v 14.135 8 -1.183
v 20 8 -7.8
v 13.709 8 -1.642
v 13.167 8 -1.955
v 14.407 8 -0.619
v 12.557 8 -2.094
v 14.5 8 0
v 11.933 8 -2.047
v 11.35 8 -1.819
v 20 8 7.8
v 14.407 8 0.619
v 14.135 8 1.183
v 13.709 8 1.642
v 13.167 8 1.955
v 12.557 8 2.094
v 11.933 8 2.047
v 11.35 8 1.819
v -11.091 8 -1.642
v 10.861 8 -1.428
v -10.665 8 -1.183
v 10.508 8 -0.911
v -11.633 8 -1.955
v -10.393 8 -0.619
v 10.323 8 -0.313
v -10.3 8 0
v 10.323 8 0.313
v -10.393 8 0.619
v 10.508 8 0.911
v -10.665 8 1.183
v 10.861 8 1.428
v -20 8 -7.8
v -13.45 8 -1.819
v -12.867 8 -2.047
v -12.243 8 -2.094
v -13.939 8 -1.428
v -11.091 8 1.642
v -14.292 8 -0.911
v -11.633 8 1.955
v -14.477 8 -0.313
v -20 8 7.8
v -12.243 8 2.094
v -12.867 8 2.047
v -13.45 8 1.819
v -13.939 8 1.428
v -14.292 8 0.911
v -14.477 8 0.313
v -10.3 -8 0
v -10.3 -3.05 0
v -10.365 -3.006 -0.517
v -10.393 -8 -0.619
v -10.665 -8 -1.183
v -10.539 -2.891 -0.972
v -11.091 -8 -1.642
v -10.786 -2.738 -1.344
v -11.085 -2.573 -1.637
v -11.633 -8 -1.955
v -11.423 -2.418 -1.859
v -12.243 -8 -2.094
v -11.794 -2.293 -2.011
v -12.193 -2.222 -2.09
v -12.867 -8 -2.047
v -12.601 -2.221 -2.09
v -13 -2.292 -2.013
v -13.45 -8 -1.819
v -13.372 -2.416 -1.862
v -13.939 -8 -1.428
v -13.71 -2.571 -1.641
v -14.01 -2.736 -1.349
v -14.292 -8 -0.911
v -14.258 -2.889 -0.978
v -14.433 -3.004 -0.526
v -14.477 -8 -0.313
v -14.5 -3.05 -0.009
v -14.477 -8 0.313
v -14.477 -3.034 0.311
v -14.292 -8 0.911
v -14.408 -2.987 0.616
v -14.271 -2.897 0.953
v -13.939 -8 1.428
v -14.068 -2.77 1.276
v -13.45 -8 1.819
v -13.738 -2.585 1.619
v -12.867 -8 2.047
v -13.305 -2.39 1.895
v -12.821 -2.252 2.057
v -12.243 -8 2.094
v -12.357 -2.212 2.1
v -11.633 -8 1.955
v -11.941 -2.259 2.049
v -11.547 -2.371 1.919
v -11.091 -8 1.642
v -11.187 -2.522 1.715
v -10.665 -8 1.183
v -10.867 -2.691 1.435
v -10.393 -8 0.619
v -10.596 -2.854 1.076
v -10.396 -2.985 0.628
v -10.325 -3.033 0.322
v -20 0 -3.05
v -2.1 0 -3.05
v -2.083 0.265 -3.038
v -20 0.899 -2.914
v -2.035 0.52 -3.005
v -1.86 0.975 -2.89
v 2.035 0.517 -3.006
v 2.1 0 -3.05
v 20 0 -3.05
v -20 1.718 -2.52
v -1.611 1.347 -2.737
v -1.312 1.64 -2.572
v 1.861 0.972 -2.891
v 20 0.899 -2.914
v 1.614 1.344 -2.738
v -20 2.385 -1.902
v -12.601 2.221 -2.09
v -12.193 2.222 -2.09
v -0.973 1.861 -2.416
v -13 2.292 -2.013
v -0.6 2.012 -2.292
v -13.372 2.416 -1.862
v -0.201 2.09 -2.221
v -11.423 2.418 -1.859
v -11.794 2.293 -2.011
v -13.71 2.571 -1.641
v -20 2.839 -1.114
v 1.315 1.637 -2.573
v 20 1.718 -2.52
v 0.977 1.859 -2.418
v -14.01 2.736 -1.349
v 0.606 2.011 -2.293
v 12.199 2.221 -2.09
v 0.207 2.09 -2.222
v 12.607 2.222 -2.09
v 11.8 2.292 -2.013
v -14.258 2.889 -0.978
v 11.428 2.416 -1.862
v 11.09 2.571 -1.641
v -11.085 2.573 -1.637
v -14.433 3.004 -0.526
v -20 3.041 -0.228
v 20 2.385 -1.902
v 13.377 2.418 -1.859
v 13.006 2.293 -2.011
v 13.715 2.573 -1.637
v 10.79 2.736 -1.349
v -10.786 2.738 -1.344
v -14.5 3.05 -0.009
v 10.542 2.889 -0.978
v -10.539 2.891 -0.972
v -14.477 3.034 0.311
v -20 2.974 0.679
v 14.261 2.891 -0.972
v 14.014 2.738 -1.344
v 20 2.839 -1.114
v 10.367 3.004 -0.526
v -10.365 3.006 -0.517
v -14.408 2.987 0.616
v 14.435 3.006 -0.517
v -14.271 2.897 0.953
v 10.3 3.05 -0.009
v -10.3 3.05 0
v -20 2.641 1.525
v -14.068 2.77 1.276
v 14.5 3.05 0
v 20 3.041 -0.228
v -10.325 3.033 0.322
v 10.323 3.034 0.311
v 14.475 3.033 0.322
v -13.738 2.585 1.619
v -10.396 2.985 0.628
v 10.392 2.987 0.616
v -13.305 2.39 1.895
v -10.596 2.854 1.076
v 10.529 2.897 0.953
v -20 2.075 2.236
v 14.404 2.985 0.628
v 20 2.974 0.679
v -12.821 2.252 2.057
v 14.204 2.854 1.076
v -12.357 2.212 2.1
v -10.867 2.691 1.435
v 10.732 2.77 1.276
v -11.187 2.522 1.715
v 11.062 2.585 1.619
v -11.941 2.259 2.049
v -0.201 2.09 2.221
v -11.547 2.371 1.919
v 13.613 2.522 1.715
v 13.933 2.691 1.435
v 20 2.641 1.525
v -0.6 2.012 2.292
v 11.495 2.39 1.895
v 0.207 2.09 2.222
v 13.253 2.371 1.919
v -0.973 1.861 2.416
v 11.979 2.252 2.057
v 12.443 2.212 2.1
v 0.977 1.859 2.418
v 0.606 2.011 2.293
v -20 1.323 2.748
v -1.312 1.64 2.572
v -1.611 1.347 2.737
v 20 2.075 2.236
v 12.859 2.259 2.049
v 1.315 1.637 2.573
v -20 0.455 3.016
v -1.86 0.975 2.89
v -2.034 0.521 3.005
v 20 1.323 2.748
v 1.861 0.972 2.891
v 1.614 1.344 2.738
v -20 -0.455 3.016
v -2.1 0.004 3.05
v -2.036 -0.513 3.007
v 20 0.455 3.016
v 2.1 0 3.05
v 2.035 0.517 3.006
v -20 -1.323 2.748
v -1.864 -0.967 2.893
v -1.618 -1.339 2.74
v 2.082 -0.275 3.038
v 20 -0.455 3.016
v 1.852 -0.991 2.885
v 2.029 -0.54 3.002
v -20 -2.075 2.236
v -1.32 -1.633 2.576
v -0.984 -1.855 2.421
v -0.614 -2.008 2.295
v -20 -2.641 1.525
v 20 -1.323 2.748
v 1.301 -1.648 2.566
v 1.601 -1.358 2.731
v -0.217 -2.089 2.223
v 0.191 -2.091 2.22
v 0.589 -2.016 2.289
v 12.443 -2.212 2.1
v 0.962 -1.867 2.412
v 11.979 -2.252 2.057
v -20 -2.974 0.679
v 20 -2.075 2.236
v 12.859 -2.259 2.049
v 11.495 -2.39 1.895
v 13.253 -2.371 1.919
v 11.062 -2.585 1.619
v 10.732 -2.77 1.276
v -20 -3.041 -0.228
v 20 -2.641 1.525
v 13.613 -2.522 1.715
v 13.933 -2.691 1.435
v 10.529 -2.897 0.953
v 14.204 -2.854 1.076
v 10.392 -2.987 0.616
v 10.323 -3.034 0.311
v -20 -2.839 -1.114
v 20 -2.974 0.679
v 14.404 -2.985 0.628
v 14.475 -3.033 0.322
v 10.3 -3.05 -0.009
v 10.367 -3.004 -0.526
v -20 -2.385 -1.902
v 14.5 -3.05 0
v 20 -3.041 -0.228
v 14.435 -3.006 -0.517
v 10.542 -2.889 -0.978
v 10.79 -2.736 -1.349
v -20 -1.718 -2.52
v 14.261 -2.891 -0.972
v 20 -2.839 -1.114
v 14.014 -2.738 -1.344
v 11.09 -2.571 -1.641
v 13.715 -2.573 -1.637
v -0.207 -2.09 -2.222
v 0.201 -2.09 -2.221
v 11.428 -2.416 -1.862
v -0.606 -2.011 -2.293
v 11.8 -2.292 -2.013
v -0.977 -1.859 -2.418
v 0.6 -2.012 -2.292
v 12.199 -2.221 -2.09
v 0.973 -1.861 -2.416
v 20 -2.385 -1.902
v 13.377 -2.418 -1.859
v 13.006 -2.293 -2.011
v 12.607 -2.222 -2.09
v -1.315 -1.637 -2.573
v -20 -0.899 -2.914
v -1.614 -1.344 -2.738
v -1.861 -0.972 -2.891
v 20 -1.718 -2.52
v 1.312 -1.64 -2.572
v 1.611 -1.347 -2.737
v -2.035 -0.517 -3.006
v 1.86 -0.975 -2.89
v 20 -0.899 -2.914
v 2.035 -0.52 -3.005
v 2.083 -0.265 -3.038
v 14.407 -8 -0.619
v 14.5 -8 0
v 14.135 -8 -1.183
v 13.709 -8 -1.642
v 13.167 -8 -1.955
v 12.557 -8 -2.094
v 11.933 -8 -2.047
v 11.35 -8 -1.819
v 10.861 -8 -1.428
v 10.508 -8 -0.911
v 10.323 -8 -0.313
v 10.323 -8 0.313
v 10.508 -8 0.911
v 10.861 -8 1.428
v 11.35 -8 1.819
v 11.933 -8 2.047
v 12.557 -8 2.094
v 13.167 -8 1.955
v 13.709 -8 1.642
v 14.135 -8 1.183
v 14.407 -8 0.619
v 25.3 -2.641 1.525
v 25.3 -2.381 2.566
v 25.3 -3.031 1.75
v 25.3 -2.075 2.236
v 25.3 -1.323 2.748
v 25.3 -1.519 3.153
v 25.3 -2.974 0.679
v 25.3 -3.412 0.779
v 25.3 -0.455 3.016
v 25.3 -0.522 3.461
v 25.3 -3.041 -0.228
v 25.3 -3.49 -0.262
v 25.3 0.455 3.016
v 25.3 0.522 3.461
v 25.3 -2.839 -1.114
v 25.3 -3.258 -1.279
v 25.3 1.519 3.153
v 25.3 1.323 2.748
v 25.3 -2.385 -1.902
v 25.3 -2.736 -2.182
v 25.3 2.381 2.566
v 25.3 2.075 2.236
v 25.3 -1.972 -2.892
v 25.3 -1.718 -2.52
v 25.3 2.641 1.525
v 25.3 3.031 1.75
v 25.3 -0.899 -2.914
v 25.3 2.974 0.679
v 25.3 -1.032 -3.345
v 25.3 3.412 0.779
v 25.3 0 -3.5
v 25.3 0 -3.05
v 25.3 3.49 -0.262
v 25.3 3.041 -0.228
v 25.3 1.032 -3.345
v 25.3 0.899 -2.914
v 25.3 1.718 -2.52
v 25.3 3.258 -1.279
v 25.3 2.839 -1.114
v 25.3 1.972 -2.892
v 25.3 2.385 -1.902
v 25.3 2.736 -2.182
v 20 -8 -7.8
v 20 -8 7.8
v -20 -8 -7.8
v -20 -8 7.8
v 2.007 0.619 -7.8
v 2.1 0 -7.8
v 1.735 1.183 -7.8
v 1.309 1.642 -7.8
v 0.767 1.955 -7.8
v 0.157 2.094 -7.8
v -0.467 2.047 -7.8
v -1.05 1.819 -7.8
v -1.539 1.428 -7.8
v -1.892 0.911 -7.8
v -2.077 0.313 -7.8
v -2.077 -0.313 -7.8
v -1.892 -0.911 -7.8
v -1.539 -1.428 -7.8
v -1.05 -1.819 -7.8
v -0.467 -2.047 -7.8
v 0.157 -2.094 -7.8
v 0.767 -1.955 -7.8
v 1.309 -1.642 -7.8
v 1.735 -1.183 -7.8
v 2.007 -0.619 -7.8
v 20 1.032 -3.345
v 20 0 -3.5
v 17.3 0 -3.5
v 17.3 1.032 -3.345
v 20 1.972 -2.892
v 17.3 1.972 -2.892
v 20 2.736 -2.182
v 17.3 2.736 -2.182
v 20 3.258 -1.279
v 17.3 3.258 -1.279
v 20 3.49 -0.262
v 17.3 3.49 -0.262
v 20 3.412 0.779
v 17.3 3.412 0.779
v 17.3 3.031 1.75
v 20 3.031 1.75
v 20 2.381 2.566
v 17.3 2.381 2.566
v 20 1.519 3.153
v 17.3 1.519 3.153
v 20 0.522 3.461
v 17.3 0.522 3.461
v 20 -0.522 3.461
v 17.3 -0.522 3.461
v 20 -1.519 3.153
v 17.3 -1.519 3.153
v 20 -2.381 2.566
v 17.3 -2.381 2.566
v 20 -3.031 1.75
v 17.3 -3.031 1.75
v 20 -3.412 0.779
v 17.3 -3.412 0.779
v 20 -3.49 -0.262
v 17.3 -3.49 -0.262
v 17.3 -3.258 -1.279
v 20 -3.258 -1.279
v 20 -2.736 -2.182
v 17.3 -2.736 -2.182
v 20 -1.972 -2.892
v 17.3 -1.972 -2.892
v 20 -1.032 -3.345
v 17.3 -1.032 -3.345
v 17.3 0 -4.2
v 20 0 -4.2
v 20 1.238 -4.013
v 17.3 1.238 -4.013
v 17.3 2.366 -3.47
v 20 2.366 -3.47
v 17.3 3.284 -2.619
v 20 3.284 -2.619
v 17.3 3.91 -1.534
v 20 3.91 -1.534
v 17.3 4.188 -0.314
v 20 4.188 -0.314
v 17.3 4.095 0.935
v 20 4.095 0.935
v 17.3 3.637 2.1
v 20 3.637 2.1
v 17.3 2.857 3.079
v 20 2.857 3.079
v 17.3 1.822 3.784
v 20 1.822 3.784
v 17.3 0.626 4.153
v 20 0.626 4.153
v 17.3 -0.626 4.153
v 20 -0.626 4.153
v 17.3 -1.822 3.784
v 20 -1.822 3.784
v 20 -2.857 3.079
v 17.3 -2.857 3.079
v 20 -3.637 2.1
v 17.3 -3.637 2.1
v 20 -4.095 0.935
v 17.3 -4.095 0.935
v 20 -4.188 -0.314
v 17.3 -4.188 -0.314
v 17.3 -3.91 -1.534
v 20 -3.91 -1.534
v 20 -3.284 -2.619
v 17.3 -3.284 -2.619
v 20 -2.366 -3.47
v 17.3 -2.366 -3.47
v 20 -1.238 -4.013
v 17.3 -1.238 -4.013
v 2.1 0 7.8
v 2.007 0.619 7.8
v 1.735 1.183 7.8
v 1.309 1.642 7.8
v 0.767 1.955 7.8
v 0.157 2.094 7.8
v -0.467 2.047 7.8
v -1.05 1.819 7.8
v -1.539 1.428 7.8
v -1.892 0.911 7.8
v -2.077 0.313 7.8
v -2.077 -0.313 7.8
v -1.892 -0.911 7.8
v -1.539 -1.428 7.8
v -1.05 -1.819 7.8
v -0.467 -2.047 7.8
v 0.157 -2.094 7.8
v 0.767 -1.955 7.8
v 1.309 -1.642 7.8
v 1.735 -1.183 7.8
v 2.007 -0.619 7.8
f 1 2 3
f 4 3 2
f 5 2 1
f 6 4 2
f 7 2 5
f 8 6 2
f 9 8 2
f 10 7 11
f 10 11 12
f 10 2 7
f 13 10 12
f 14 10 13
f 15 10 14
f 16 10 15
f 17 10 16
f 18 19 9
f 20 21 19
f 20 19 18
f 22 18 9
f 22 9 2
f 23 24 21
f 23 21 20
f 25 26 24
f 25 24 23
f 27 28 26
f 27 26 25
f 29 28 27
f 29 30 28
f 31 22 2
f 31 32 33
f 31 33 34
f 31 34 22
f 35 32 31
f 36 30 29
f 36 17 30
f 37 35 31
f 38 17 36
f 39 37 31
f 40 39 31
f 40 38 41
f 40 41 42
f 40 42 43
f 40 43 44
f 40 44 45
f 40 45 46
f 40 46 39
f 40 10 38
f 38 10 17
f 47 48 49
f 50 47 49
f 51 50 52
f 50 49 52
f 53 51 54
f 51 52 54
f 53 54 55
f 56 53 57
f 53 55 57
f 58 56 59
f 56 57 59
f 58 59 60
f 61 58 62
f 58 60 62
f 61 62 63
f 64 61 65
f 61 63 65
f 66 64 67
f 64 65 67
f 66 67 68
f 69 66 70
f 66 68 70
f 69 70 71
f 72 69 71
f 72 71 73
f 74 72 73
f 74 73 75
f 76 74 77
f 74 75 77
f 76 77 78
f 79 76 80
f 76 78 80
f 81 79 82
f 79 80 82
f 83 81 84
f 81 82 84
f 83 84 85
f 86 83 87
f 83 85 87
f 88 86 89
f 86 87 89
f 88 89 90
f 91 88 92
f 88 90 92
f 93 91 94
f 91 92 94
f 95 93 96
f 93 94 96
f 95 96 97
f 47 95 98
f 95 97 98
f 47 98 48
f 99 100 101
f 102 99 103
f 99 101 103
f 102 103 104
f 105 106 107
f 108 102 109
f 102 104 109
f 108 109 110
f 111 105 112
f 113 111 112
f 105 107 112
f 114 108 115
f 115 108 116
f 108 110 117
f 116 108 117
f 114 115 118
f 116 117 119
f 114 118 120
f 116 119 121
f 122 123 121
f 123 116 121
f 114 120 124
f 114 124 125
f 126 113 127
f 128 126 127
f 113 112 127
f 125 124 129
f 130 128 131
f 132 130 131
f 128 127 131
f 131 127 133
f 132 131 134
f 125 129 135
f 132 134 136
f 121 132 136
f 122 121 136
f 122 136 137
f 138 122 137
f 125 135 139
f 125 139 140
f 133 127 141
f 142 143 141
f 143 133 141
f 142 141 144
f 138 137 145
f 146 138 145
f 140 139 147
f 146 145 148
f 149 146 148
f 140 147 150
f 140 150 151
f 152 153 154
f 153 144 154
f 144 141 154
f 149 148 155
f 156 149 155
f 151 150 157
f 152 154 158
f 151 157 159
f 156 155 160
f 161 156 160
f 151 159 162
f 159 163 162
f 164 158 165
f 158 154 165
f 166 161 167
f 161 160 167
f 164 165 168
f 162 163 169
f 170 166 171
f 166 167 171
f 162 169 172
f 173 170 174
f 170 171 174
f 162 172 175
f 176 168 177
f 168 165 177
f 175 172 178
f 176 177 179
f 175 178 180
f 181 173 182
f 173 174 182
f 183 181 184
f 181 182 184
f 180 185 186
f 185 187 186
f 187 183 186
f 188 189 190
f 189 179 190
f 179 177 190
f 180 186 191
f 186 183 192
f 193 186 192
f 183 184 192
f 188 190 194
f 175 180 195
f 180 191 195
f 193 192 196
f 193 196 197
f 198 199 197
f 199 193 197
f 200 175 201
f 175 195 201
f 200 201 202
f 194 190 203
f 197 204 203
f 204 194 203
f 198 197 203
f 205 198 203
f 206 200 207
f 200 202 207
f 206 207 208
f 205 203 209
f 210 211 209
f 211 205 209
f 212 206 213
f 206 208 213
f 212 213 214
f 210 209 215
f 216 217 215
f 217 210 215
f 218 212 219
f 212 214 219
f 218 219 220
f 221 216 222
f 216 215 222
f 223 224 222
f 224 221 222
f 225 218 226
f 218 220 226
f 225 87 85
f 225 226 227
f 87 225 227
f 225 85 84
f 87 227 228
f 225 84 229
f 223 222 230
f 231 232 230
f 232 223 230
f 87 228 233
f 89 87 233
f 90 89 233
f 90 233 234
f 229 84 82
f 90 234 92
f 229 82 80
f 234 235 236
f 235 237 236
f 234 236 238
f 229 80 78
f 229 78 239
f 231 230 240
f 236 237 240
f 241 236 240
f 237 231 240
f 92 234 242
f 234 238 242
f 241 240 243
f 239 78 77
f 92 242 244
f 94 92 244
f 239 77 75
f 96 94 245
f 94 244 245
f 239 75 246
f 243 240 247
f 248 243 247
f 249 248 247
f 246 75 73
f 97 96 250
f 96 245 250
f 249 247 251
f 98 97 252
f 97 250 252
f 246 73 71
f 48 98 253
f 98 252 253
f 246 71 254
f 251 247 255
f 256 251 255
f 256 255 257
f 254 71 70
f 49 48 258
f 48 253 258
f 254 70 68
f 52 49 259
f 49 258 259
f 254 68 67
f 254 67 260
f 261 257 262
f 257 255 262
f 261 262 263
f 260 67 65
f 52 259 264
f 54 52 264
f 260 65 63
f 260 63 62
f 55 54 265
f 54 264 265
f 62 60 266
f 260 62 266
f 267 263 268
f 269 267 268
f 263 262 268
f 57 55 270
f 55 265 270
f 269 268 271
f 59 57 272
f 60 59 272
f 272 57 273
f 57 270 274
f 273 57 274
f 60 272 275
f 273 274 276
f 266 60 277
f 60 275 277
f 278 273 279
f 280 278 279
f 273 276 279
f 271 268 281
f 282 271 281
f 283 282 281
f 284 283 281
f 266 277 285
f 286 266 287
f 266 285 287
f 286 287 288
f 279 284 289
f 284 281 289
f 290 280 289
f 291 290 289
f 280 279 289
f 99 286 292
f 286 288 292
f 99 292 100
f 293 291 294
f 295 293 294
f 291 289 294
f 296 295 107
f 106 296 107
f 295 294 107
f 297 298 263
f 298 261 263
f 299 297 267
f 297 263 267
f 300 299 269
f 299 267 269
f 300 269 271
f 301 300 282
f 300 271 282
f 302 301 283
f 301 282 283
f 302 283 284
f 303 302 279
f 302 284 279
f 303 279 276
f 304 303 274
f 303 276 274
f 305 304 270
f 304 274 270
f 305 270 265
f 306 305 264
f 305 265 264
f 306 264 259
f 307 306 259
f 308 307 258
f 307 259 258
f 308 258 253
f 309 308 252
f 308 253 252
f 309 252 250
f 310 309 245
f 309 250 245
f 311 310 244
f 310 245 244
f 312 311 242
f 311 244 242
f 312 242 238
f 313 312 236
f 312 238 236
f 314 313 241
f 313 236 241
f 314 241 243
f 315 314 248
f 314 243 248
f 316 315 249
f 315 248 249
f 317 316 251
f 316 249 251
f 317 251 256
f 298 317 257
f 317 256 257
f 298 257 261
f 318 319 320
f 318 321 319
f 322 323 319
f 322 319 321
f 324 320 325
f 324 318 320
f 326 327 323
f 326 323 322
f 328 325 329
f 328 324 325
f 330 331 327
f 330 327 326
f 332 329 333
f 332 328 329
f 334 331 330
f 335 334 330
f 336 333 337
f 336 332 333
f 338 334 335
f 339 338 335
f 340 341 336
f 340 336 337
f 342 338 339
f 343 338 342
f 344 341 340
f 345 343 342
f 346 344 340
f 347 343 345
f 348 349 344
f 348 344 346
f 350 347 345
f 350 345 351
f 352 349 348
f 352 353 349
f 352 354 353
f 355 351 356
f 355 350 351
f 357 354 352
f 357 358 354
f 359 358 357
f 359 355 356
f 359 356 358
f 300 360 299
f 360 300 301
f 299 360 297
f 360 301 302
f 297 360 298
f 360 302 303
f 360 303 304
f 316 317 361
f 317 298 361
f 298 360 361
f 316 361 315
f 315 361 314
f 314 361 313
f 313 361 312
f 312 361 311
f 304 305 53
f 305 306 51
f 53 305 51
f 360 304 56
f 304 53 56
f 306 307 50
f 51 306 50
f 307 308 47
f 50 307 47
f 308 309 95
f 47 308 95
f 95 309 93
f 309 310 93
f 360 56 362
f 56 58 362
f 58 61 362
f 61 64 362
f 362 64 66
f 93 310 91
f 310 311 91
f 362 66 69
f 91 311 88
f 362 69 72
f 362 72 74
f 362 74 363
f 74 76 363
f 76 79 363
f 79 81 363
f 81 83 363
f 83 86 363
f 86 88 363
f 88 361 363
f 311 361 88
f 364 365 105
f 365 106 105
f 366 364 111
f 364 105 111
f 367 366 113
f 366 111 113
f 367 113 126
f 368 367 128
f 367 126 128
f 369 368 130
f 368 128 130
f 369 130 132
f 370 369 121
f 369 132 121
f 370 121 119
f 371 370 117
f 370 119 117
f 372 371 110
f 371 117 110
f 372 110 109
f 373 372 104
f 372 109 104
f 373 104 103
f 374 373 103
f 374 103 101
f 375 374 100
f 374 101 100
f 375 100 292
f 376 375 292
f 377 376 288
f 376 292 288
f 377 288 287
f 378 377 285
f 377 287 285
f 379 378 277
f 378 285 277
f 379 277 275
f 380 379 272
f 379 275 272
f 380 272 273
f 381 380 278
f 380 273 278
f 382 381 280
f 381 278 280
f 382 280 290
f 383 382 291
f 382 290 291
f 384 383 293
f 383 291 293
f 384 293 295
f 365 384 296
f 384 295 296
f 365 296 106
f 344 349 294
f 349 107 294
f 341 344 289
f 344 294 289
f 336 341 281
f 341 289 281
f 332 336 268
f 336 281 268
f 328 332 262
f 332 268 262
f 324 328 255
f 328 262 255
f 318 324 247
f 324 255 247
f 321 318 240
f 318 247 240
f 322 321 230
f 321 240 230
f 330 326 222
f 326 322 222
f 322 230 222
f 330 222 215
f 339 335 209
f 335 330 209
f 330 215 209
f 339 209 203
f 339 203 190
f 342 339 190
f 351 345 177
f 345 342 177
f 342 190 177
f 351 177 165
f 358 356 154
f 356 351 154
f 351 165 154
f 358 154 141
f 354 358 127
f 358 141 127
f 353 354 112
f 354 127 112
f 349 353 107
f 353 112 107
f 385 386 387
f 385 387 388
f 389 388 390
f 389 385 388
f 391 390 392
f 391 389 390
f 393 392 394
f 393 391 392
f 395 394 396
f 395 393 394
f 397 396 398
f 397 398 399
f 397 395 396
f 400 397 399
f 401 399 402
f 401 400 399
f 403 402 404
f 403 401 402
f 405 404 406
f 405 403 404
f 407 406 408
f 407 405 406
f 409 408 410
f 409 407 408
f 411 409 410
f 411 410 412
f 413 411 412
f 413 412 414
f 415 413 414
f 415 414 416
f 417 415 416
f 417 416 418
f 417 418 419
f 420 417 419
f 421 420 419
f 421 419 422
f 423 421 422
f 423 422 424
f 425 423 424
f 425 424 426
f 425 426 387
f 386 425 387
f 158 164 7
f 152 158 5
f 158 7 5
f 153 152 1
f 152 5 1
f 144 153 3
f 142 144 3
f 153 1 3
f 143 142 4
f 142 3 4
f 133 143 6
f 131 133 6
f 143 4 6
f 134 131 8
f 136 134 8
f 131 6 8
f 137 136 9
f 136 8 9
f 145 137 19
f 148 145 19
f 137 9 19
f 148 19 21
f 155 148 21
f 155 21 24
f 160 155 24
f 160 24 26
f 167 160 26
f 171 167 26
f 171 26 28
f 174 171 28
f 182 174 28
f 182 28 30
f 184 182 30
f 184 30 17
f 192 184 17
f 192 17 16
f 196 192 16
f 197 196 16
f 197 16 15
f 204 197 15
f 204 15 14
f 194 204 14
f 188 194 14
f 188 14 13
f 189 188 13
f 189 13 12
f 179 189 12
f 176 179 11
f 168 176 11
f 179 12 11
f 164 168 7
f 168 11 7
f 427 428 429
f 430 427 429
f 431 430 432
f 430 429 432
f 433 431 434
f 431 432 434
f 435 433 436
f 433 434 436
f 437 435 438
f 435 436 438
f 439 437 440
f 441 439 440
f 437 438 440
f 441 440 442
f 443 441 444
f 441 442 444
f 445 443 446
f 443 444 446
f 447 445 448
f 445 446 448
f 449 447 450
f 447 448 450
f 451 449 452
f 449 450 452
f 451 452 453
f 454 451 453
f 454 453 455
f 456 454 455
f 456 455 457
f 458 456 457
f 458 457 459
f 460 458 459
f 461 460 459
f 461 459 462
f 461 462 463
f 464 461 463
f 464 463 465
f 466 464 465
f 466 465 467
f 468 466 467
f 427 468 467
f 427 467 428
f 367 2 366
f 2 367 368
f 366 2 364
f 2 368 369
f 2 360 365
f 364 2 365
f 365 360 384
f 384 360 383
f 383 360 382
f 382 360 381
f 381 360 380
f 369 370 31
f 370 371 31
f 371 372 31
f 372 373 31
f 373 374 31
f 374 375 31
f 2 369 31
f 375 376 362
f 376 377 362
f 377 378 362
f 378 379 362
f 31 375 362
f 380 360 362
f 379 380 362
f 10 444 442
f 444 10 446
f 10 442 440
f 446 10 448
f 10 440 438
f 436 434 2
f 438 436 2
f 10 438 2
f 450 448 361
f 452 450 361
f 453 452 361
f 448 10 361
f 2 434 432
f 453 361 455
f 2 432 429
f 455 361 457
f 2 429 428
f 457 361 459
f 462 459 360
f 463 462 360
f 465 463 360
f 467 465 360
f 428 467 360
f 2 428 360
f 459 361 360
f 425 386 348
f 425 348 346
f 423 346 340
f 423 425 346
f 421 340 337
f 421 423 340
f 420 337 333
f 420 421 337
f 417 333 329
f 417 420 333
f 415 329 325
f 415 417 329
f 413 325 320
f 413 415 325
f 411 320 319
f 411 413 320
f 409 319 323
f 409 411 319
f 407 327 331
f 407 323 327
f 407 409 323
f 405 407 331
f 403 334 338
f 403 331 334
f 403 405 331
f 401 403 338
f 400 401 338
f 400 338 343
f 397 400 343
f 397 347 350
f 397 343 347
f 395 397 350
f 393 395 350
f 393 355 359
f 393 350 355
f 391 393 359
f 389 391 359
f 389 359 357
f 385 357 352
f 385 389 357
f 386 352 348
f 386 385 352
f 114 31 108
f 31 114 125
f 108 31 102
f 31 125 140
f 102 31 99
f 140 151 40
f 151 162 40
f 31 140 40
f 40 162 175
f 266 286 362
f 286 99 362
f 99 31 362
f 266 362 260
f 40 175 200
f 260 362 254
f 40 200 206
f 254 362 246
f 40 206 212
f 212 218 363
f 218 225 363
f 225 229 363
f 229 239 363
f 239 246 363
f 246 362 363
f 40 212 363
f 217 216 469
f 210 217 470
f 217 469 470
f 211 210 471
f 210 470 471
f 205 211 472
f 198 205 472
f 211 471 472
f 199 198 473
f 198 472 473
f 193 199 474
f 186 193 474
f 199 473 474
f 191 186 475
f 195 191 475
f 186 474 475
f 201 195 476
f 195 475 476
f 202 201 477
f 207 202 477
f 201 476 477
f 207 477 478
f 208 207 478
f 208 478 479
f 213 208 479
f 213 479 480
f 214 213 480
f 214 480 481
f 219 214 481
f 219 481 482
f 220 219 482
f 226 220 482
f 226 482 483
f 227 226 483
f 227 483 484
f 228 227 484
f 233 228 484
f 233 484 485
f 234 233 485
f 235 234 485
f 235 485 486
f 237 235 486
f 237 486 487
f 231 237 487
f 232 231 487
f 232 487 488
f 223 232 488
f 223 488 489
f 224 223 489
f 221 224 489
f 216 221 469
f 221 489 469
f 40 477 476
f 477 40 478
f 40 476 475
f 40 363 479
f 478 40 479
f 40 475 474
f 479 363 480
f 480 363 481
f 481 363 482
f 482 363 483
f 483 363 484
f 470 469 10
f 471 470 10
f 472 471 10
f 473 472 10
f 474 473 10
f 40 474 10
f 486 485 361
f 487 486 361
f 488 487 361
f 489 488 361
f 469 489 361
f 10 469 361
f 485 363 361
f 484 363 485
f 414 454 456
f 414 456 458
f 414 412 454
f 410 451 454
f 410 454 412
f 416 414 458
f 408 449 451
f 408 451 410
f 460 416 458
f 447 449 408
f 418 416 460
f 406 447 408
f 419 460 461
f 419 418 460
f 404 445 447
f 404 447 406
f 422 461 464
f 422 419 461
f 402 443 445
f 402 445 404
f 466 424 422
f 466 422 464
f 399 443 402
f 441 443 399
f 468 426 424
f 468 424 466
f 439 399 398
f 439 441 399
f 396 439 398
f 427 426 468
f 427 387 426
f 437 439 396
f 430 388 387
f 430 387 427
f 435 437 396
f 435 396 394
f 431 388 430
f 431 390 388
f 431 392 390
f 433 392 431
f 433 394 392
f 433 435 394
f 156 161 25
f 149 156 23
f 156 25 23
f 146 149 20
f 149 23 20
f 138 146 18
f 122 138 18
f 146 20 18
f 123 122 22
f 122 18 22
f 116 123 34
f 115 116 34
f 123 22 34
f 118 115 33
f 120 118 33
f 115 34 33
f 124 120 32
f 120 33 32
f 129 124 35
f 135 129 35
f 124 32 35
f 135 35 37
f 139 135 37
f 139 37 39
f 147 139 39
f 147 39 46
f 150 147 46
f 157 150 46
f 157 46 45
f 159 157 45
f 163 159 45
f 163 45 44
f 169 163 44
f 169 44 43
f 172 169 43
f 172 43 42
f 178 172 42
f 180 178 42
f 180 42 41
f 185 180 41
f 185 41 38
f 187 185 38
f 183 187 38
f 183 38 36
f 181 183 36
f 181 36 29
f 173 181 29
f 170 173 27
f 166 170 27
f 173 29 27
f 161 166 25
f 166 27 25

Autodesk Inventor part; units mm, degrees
sketch "Эскиз1" plane through (0, 0, 0) normal (0, 1, 0) x (-1, 0, 0)
  line L0 (20, 7.8) -> (-20, 7.8)
  line L1 (-20, 7.8) -> (-20, -7.8)
  line L2 (-20, -7.8) -> (20, -7.8)
  line L3 (20, -7.8) -> (20, 7.8)
  line L4 (20, 7.8) -> (-20, -7.8) construction
  line L5 (-20, 7.8) -> (20, -7.8) construction
  point P0 (0, 0)
  dimension "d0" = 40
  dimension "d1" = 15.6
extrude "Выдавливание1" add sketch "Эскиз1" along normal mid plane 16
sketch "Эскиз2" plane through (20, -8, -7.8) normal (1, 0, 0) x (0, 0, -1)
  circle A0 centre (-7.8, 8) radius 3.05
  dimension "d4" = 6.1
extrude "Выдавливание2" cut sketch "Эскиз2" against normal up to next
sketch "Эскиз3" plane through (0, 8, 0) normal (0, 1, 0) x (1, 0, 0)
  circle A0 centre (-12.4, 0) radius 2.1
  circle A1 centre (12.4, 0) radius 2.1
  line L0 (28, 0) -> (-28, 0) projected
  line L1 (0, 10.92) -> (0, -10.92) projected
  line L2 (-20, 7.8) -> (-20, -7.8) projected
  line L3 (20, -7.8) -> (20, 7.8) projected
  point P0 (0, 0)
  dimension "d7" = 4.2
  dimension "d9" = 7.6
  dimension "d10" = 7.6
extrude "Выдавливание3" cut sketch "Эскиз3" against normal blind 21.75
sketch "Эскиз4" plane through (-20, 8, 7.8) normal (0, 0, 1) x (1, 0, 0)
  circle A0 centre (20, -8) radius 2.1
  dimension "d13" = 4.2
extrude "Выдавливание4" cut sketch "Эскиз4" against normal blind 19.55
sketch "Эскиз5" plane through (20, -8, -7.8) normal (1, 0, 0) x (0, 0, -1)
  circle A0 centre (-7.8, 8) radius 3.5
  circle A1 centre (-7.8, 8) radius 3.05 projected
  dimension "d17" = 7
extrude "Выдавливание5" add sketch "Эскиз5" along normal blind 5.3
sketch "Эскиз6" plane through (20, -8, -7.8) normal (1, 0, 0) x (0, 0, -1)
  circle A0 centre (-7.8, 8) radius 3.5 projected
  circle A1 centre (-7.8, 8) radius 4.2
  dimension "d20" = 8.4
extrude "Выдавливание6" cut sketch "Эскиз6" against normal blind 2.7
properties part number "новое крепление штыря стрелялки"
